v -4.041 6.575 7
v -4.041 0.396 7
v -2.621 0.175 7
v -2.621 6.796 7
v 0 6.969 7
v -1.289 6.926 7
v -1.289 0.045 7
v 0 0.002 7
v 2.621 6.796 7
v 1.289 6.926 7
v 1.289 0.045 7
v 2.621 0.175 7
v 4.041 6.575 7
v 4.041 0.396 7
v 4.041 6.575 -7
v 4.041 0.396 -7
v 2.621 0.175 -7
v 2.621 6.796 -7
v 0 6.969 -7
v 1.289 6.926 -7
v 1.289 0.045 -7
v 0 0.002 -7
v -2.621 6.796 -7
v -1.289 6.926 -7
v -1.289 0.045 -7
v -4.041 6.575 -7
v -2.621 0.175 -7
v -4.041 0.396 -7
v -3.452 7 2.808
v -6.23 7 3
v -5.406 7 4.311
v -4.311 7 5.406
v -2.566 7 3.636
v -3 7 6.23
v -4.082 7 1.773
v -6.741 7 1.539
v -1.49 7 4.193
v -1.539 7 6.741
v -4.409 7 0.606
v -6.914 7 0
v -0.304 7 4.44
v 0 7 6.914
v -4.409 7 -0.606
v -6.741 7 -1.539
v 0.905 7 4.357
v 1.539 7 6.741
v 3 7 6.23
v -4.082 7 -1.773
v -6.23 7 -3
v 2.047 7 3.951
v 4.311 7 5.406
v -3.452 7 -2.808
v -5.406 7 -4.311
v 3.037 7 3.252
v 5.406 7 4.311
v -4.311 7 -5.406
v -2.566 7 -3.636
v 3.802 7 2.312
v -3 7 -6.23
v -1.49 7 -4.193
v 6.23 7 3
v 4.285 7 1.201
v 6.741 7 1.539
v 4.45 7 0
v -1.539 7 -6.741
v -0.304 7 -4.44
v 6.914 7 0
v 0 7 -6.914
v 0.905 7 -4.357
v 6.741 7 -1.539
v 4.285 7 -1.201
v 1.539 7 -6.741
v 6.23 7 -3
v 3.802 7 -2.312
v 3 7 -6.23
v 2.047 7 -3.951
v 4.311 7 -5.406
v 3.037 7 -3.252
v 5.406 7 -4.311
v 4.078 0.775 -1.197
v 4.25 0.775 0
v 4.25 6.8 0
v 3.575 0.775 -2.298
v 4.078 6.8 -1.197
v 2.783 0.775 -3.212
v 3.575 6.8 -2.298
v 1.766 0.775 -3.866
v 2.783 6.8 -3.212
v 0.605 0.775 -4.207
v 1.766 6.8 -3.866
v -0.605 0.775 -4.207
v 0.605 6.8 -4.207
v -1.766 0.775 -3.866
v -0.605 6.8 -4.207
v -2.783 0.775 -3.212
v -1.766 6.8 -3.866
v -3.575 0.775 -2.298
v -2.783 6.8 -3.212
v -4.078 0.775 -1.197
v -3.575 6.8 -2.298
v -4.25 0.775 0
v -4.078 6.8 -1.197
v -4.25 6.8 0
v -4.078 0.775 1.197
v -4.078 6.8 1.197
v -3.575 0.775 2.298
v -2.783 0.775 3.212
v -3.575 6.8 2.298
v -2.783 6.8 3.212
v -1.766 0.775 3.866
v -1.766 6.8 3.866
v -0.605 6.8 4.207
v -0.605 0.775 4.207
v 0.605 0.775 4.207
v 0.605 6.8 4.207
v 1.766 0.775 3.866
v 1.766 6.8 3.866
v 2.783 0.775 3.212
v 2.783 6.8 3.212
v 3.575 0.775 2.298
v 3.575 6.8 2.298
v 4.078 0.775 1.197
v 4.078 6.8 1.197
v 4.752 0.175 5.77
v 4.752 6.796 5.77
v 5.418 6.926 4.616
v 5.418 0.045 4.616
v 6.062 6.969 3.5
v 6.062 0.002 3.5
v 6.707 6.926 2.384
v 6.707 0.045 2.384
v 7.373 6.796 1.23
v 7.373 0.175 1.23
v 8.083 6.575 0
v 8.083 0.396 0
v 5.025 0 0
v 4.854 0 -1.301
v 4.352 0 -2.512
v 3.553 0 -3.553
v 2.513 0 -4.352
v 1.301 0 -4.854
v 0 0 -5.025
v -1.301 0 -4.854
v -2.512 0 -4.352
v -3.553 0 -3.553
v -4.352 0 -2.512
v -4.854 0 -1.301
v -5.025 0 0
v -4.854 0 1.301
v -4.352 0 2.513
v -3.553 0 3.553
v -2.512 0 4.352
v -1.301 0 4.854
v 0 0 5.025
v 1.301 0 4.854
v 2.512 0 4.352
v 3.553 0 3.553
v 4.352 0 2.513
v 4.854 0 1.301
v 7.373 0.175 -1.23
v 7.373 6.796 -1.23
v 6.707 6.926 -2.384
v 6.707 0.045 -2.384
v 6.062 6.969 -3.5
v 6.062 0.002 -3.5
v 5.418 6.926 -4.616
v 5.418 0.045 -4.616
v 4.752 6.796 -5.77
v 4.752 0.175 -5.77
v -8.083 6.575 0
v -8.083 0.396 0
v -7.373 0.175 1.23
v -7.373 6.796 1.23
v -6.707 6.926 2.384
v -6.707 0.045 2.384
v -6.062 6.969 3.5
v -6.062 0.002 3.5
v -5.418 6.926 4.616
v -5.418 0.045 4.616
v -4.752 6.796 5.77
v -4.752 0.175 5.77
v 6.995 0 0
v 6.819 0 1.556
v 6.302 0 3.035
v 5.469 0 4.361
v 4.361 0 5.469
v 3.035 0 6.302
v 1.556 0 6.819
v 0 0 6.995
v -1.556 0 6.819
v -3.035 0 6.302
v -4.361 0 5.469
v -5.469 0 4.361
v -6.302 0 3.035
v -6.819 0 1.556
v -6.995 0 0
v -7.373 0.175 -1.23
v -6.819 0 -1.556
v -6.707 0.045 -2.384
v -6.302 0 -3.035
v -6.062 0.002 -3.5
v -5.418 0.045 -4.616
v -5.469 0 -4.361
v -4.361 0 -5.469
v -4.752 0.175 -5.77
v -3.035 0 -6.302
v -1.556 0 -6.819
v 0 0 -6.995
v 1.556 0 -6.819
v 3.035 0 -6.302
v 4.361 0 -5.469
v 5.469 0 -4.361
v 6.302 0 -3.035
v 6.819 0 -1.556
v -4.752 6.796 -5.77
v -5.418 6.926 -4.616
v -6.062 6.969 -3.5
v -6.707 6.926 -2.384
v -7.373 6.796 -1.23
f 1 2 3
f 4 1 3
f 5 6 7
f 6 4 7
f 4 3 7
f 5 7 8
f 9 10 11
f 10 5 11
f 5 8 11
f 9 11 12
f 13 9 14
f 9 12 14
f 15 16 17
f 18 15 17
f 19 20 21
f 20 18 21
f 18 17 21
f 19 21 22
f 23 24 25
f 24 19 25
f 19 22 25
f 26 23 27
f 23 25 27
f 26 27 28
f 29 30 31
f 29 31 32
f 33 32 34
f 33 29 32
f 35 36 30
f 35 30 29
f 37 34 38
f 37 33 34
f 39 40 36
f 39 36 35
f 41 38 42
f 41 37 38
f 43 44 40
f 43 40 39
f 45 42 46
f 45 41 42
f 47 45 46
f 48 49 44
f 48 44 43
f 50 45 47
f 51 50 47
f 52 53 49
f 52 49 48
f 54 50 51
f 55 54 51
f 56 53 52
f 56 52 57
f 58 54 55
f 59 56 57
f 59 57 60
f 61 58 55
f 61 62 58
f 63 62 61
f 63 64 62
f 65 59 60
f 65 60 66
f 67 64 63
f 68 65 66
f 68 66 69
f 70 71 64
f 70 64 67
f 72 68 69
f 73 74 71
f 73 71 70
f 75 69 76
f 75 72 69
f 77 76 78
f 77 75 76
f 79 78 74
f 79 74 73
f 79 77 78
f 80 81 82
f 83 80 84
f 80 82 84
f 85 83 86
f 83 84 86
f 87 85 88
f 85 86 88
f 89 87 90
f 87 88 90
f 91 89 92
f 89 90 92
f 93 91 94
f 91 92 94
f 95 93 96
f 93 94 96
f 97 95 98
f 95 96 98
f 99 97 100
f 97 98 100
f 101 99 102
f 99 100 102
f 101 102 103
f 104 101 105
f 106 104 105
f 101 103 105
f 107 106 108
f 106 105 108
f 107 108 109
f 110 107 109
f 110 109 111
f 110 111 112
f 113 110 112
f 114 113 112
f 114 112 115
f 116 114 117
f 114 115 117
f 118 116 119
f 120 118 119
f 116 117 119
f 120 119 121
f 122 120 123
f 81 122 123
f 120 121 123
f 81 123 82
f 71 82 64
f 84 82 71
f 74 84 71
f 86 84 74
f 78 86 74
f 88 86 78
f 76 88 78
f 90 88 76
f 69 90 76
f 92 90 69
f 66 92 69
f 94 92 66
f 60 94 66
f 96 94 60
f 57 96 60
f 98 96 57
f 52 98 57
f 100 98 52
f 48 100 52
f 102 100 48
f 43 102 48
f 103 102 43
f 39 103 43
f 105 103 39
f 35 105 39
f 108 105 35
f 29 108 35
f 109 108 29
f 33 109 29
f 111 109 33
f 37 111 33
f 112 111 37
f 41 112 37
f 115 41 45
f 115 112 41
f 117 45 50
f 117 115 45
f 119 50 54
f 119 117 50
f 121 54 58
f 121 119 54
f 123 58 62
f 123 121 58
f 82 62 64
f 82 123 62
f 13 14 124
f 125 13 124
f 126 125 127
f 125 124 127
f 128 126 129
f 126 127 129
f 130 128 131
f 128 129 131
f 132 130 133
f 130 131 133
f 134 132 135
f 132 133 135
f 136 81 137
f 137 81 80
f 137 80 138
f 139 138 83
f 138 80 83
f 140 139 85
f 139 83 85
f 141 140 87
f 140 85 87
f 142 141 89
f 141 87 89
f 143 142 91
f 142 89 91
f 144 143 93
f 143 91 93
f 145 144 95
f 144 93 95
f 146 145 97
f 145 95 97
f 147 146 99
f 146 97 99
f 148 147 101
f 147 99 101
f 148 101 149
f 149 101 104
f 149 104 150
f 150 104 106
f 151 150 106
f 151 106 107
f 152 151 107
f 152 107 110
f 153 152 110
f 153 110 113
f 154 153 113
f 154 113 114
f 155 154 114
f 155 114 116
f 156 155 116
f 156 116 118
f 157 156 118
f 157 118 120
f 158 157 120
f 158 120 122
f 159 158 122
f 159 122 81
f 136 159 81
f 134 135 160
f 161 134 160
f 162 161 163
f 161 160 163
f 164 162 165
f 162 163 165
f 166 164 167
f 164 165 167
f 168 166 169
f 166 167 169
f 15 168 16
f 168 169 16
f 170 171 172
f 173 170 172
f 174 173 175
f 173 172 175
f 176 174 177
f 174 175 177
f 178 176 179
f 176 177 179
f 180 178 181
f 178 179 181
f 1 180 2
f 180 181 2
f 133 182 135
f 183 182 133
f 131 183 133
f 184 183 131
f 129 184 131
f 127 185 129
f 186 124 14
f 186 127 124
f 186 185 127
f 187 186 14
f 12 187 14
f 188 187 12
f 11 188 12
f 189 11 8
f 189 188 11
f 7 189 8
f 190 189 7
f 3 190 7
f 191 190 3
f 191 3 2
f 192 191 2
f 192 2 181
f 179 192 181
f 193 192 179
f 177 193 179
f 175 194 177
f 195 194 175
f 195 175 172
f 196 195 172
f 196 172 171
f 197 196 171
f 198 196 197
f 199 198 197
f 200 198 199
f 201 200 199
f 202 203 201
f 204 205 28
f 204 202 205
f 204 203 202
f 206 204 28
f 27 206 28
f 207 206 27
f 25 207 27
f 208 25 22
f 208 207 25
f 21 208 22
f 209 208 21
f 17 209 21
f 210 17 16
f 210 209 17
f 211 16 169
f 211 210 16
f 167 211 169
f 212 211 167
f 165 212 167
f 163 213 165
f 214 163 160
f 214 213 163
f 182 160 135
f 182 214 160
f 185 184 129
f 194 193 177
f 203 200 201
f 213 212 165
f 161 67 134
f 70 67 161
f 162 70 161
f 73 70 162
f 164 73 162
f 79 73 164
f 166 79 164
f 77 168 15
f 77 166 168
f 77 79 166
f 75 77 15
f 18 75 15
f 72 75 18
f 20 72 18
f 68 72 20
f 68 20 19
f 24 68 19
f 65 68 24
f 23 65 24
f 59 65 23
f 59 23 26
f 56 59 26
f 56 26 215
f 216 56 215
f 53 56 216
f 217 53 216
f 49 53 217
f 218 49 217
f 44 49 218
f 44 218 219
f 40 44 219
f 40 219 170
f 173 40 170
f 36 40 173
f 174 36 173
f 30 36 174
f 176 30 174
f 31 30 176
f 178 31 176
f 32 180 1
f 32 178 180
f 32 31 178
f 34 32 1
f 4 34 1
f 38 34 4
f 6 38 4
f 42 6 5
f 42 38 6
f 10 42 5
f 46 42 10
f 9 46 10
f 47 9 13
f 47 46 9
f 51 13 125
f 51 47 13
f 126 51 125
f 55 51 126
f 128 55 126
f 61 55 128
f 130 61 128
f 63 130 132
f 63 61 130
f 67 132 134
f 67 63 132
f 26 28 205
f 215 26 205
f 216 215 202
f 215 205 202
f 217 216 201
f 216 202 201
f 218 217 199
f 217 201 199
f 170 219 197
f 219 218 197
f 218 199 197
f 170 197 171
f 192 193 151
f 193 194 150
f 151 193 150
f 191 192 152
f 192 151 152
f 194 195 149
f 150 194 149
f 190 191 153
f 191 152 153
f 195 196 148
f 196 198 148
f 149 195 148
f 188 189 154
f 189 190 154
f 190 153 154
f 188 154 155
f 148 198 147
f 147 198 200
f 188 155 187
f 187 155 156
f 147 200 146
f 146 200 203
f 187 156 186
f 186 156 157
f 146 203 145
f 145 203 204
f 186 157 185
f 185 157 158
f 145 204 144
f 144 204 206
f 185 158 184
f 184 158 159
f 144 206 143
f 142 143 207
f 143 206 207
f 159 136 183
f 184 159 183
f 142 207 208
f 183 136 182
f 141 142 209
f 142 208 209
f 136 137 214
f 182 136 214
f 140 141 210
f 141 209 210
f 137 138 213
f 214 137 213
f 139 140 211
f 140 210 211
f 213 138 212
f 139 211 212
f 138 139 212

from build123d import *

# Parameters (mm, degrees)
RESSALTO_EXTRUS_O2_DEPTH         = 7
FURO_ROSCADO_DE_M101_D           = 8.5
FURO_ROSCADO_DE_M101_CSINK_D     = 10.05
FURO_ROSCADO_DE_M101_CSINK_ANGLE = 90
CHANFRO2_SIZE                    = 0.2
ESBO_O5_OUTSIDE_W                = 94.1
ESBO_O5_OUTSIDE_H                = 91.934
ESBO_O5_OUTSIDE_R                = 6.914339911
CORTE_EXTRUS_O1_DEPTH            = 13
CORTE_EXTRUS_O1_DRAFT            = -70
ESBO_O6_OUTSIDE_W                = 94.1
ESBO_O6_OUTSIDE_H                = 91.934
ESBO_O6_OUTSIDE_R                = 6.994841317
CORTE_EXTRUS_O2_DEPTH            = 13
CORTE_EXTRUS_O2_DRAFT            = -70


with BuildPart() as part:
    # Esboço1 → Ressalto-extrusão2 (new body)
    with BuildSketch(Plane(origin=(0, 0, 0), x_dir=(1, 0, 0), z_dir=(0, 1, 0))):
        Polygon((4.041451884, 7), (-4.041451884, 7), (-8.082903769, 0), (-4.041451884, -7), (4.041451884, -7), (8.082903769, 0), align=None)
    extrude(amount=RESSALTO_EXTRUS_O2_DEPTH)

    # Furo roscado de M101 (through all)
    with Locations(Plane(origin=(0, 0, 0), x_dir=(-1, 0, 0), z_dir=(0, -1, 0))):
        with Locations((0, 0)):
            CounterSinkHole(FURO_ROSCADO_DE_M101_D / 2, FURO_ROSCADO_DE_M101_CSINK_D / 2, counter_sink_angle=FURO_ROSCADO_DE_M101_CSINK_ANGLE)

    # Chanfro2
    chanfro2_edges = [part.edges().sort_by_distance(p)[0] for p in [
        (-4.25, 7, 0),
    ]]
    chamfer(chanfro2_edges, length=CHANFRO2_SIZE)


with BuildPart() as corte_extrus_o1_tool:
    # Esboço5 outside → Corte-extrusão1 (with draft: the straight prism first)
    with BuildSketch(Plane(origin=(0, 7, 0), x_dir=(1, 0, 0), z_dir=(0, 1, 0))):
        Rectangle(ESBO_O5_OUTSIDE_W, ESBO_O5_OUTSIDE_H)
        Circle(ESBO_O5_OUTSIDE_R, mode=Mode.SUBTRACT)
    extrude(amount=-CORTE_EXTRUS_O1_DEPTH)
    # Corte-extrusão1: the draft: its side faces are tilted about the plane it starts from
    corte_extrus_o1_sides = [corte_extrus_o1_tool.faces().sort_by_distance(p)[0] for p in [
        (0, 0.5, 45.967),
        (47.05, 0.5, 0),
        (0, 0.5, -45.967),
        (-47.05, 0.5, 0),
        (-6.914339911, 0.5, 0),
    ]]
    draft(corte_extrus_o1_sides, Plane(origin=(0, 7, 0), x_dir=(1, 0, 0), z_dir=(0, 1, 0)), CORTE_EXTRUS_O1_DRAFT)


with BuildPart() as part_1:
    add(part.part)

    # Corte-extrusão1: cut by corte_extrus_o1_tool
    add(corte_extrus_o1_tool.part, mode=Mode.SUBTRACT)


with BuildPart() as corte_extrus_o2_tool:
    # Esboço6 outside → Corte-extrusão2 (with draft: the straight prism first)
    with BuildSketch(Plane.XZ):
        Rectangle(ESBO_O6_OUTSIDE_W, ESBO_O6_OUTSIDE_H)
        Circle(ESBO_O6_OUTSIDE_R, mode=Mode.SUBTRACT)
    extrude(amount=-CORTE_EXTRUS_O2_DEPTH)
    # Corte-extrusão2: the draft: its side faces are tilted about the plane it starts from
    corte_extrus_o2_sides = [corte_extrus_o2_tool.faces().sort_by_distance(p)[0] for p in [
        (0, 6.5, -45.967),
        (47.05, 6.5, 0),
        (0, 6.5, 45.967),
        (-47.05, 6.5, 0),
        (-6.994841317, 6.5, 0),
    ]]
    draft(corte_extrus_o2_sides, Plane.XZ, CORTE_EXTRUS_O2_DRAFT)


with BuildPart() as part_2:
    add(part_1.part)

    # Corte-extrusão2: cut by corte_extrus_o2_tool
    add(corte_extrus_o2_tool.part, mode=Mode.SUBTRACT)


solid = part_2.part
